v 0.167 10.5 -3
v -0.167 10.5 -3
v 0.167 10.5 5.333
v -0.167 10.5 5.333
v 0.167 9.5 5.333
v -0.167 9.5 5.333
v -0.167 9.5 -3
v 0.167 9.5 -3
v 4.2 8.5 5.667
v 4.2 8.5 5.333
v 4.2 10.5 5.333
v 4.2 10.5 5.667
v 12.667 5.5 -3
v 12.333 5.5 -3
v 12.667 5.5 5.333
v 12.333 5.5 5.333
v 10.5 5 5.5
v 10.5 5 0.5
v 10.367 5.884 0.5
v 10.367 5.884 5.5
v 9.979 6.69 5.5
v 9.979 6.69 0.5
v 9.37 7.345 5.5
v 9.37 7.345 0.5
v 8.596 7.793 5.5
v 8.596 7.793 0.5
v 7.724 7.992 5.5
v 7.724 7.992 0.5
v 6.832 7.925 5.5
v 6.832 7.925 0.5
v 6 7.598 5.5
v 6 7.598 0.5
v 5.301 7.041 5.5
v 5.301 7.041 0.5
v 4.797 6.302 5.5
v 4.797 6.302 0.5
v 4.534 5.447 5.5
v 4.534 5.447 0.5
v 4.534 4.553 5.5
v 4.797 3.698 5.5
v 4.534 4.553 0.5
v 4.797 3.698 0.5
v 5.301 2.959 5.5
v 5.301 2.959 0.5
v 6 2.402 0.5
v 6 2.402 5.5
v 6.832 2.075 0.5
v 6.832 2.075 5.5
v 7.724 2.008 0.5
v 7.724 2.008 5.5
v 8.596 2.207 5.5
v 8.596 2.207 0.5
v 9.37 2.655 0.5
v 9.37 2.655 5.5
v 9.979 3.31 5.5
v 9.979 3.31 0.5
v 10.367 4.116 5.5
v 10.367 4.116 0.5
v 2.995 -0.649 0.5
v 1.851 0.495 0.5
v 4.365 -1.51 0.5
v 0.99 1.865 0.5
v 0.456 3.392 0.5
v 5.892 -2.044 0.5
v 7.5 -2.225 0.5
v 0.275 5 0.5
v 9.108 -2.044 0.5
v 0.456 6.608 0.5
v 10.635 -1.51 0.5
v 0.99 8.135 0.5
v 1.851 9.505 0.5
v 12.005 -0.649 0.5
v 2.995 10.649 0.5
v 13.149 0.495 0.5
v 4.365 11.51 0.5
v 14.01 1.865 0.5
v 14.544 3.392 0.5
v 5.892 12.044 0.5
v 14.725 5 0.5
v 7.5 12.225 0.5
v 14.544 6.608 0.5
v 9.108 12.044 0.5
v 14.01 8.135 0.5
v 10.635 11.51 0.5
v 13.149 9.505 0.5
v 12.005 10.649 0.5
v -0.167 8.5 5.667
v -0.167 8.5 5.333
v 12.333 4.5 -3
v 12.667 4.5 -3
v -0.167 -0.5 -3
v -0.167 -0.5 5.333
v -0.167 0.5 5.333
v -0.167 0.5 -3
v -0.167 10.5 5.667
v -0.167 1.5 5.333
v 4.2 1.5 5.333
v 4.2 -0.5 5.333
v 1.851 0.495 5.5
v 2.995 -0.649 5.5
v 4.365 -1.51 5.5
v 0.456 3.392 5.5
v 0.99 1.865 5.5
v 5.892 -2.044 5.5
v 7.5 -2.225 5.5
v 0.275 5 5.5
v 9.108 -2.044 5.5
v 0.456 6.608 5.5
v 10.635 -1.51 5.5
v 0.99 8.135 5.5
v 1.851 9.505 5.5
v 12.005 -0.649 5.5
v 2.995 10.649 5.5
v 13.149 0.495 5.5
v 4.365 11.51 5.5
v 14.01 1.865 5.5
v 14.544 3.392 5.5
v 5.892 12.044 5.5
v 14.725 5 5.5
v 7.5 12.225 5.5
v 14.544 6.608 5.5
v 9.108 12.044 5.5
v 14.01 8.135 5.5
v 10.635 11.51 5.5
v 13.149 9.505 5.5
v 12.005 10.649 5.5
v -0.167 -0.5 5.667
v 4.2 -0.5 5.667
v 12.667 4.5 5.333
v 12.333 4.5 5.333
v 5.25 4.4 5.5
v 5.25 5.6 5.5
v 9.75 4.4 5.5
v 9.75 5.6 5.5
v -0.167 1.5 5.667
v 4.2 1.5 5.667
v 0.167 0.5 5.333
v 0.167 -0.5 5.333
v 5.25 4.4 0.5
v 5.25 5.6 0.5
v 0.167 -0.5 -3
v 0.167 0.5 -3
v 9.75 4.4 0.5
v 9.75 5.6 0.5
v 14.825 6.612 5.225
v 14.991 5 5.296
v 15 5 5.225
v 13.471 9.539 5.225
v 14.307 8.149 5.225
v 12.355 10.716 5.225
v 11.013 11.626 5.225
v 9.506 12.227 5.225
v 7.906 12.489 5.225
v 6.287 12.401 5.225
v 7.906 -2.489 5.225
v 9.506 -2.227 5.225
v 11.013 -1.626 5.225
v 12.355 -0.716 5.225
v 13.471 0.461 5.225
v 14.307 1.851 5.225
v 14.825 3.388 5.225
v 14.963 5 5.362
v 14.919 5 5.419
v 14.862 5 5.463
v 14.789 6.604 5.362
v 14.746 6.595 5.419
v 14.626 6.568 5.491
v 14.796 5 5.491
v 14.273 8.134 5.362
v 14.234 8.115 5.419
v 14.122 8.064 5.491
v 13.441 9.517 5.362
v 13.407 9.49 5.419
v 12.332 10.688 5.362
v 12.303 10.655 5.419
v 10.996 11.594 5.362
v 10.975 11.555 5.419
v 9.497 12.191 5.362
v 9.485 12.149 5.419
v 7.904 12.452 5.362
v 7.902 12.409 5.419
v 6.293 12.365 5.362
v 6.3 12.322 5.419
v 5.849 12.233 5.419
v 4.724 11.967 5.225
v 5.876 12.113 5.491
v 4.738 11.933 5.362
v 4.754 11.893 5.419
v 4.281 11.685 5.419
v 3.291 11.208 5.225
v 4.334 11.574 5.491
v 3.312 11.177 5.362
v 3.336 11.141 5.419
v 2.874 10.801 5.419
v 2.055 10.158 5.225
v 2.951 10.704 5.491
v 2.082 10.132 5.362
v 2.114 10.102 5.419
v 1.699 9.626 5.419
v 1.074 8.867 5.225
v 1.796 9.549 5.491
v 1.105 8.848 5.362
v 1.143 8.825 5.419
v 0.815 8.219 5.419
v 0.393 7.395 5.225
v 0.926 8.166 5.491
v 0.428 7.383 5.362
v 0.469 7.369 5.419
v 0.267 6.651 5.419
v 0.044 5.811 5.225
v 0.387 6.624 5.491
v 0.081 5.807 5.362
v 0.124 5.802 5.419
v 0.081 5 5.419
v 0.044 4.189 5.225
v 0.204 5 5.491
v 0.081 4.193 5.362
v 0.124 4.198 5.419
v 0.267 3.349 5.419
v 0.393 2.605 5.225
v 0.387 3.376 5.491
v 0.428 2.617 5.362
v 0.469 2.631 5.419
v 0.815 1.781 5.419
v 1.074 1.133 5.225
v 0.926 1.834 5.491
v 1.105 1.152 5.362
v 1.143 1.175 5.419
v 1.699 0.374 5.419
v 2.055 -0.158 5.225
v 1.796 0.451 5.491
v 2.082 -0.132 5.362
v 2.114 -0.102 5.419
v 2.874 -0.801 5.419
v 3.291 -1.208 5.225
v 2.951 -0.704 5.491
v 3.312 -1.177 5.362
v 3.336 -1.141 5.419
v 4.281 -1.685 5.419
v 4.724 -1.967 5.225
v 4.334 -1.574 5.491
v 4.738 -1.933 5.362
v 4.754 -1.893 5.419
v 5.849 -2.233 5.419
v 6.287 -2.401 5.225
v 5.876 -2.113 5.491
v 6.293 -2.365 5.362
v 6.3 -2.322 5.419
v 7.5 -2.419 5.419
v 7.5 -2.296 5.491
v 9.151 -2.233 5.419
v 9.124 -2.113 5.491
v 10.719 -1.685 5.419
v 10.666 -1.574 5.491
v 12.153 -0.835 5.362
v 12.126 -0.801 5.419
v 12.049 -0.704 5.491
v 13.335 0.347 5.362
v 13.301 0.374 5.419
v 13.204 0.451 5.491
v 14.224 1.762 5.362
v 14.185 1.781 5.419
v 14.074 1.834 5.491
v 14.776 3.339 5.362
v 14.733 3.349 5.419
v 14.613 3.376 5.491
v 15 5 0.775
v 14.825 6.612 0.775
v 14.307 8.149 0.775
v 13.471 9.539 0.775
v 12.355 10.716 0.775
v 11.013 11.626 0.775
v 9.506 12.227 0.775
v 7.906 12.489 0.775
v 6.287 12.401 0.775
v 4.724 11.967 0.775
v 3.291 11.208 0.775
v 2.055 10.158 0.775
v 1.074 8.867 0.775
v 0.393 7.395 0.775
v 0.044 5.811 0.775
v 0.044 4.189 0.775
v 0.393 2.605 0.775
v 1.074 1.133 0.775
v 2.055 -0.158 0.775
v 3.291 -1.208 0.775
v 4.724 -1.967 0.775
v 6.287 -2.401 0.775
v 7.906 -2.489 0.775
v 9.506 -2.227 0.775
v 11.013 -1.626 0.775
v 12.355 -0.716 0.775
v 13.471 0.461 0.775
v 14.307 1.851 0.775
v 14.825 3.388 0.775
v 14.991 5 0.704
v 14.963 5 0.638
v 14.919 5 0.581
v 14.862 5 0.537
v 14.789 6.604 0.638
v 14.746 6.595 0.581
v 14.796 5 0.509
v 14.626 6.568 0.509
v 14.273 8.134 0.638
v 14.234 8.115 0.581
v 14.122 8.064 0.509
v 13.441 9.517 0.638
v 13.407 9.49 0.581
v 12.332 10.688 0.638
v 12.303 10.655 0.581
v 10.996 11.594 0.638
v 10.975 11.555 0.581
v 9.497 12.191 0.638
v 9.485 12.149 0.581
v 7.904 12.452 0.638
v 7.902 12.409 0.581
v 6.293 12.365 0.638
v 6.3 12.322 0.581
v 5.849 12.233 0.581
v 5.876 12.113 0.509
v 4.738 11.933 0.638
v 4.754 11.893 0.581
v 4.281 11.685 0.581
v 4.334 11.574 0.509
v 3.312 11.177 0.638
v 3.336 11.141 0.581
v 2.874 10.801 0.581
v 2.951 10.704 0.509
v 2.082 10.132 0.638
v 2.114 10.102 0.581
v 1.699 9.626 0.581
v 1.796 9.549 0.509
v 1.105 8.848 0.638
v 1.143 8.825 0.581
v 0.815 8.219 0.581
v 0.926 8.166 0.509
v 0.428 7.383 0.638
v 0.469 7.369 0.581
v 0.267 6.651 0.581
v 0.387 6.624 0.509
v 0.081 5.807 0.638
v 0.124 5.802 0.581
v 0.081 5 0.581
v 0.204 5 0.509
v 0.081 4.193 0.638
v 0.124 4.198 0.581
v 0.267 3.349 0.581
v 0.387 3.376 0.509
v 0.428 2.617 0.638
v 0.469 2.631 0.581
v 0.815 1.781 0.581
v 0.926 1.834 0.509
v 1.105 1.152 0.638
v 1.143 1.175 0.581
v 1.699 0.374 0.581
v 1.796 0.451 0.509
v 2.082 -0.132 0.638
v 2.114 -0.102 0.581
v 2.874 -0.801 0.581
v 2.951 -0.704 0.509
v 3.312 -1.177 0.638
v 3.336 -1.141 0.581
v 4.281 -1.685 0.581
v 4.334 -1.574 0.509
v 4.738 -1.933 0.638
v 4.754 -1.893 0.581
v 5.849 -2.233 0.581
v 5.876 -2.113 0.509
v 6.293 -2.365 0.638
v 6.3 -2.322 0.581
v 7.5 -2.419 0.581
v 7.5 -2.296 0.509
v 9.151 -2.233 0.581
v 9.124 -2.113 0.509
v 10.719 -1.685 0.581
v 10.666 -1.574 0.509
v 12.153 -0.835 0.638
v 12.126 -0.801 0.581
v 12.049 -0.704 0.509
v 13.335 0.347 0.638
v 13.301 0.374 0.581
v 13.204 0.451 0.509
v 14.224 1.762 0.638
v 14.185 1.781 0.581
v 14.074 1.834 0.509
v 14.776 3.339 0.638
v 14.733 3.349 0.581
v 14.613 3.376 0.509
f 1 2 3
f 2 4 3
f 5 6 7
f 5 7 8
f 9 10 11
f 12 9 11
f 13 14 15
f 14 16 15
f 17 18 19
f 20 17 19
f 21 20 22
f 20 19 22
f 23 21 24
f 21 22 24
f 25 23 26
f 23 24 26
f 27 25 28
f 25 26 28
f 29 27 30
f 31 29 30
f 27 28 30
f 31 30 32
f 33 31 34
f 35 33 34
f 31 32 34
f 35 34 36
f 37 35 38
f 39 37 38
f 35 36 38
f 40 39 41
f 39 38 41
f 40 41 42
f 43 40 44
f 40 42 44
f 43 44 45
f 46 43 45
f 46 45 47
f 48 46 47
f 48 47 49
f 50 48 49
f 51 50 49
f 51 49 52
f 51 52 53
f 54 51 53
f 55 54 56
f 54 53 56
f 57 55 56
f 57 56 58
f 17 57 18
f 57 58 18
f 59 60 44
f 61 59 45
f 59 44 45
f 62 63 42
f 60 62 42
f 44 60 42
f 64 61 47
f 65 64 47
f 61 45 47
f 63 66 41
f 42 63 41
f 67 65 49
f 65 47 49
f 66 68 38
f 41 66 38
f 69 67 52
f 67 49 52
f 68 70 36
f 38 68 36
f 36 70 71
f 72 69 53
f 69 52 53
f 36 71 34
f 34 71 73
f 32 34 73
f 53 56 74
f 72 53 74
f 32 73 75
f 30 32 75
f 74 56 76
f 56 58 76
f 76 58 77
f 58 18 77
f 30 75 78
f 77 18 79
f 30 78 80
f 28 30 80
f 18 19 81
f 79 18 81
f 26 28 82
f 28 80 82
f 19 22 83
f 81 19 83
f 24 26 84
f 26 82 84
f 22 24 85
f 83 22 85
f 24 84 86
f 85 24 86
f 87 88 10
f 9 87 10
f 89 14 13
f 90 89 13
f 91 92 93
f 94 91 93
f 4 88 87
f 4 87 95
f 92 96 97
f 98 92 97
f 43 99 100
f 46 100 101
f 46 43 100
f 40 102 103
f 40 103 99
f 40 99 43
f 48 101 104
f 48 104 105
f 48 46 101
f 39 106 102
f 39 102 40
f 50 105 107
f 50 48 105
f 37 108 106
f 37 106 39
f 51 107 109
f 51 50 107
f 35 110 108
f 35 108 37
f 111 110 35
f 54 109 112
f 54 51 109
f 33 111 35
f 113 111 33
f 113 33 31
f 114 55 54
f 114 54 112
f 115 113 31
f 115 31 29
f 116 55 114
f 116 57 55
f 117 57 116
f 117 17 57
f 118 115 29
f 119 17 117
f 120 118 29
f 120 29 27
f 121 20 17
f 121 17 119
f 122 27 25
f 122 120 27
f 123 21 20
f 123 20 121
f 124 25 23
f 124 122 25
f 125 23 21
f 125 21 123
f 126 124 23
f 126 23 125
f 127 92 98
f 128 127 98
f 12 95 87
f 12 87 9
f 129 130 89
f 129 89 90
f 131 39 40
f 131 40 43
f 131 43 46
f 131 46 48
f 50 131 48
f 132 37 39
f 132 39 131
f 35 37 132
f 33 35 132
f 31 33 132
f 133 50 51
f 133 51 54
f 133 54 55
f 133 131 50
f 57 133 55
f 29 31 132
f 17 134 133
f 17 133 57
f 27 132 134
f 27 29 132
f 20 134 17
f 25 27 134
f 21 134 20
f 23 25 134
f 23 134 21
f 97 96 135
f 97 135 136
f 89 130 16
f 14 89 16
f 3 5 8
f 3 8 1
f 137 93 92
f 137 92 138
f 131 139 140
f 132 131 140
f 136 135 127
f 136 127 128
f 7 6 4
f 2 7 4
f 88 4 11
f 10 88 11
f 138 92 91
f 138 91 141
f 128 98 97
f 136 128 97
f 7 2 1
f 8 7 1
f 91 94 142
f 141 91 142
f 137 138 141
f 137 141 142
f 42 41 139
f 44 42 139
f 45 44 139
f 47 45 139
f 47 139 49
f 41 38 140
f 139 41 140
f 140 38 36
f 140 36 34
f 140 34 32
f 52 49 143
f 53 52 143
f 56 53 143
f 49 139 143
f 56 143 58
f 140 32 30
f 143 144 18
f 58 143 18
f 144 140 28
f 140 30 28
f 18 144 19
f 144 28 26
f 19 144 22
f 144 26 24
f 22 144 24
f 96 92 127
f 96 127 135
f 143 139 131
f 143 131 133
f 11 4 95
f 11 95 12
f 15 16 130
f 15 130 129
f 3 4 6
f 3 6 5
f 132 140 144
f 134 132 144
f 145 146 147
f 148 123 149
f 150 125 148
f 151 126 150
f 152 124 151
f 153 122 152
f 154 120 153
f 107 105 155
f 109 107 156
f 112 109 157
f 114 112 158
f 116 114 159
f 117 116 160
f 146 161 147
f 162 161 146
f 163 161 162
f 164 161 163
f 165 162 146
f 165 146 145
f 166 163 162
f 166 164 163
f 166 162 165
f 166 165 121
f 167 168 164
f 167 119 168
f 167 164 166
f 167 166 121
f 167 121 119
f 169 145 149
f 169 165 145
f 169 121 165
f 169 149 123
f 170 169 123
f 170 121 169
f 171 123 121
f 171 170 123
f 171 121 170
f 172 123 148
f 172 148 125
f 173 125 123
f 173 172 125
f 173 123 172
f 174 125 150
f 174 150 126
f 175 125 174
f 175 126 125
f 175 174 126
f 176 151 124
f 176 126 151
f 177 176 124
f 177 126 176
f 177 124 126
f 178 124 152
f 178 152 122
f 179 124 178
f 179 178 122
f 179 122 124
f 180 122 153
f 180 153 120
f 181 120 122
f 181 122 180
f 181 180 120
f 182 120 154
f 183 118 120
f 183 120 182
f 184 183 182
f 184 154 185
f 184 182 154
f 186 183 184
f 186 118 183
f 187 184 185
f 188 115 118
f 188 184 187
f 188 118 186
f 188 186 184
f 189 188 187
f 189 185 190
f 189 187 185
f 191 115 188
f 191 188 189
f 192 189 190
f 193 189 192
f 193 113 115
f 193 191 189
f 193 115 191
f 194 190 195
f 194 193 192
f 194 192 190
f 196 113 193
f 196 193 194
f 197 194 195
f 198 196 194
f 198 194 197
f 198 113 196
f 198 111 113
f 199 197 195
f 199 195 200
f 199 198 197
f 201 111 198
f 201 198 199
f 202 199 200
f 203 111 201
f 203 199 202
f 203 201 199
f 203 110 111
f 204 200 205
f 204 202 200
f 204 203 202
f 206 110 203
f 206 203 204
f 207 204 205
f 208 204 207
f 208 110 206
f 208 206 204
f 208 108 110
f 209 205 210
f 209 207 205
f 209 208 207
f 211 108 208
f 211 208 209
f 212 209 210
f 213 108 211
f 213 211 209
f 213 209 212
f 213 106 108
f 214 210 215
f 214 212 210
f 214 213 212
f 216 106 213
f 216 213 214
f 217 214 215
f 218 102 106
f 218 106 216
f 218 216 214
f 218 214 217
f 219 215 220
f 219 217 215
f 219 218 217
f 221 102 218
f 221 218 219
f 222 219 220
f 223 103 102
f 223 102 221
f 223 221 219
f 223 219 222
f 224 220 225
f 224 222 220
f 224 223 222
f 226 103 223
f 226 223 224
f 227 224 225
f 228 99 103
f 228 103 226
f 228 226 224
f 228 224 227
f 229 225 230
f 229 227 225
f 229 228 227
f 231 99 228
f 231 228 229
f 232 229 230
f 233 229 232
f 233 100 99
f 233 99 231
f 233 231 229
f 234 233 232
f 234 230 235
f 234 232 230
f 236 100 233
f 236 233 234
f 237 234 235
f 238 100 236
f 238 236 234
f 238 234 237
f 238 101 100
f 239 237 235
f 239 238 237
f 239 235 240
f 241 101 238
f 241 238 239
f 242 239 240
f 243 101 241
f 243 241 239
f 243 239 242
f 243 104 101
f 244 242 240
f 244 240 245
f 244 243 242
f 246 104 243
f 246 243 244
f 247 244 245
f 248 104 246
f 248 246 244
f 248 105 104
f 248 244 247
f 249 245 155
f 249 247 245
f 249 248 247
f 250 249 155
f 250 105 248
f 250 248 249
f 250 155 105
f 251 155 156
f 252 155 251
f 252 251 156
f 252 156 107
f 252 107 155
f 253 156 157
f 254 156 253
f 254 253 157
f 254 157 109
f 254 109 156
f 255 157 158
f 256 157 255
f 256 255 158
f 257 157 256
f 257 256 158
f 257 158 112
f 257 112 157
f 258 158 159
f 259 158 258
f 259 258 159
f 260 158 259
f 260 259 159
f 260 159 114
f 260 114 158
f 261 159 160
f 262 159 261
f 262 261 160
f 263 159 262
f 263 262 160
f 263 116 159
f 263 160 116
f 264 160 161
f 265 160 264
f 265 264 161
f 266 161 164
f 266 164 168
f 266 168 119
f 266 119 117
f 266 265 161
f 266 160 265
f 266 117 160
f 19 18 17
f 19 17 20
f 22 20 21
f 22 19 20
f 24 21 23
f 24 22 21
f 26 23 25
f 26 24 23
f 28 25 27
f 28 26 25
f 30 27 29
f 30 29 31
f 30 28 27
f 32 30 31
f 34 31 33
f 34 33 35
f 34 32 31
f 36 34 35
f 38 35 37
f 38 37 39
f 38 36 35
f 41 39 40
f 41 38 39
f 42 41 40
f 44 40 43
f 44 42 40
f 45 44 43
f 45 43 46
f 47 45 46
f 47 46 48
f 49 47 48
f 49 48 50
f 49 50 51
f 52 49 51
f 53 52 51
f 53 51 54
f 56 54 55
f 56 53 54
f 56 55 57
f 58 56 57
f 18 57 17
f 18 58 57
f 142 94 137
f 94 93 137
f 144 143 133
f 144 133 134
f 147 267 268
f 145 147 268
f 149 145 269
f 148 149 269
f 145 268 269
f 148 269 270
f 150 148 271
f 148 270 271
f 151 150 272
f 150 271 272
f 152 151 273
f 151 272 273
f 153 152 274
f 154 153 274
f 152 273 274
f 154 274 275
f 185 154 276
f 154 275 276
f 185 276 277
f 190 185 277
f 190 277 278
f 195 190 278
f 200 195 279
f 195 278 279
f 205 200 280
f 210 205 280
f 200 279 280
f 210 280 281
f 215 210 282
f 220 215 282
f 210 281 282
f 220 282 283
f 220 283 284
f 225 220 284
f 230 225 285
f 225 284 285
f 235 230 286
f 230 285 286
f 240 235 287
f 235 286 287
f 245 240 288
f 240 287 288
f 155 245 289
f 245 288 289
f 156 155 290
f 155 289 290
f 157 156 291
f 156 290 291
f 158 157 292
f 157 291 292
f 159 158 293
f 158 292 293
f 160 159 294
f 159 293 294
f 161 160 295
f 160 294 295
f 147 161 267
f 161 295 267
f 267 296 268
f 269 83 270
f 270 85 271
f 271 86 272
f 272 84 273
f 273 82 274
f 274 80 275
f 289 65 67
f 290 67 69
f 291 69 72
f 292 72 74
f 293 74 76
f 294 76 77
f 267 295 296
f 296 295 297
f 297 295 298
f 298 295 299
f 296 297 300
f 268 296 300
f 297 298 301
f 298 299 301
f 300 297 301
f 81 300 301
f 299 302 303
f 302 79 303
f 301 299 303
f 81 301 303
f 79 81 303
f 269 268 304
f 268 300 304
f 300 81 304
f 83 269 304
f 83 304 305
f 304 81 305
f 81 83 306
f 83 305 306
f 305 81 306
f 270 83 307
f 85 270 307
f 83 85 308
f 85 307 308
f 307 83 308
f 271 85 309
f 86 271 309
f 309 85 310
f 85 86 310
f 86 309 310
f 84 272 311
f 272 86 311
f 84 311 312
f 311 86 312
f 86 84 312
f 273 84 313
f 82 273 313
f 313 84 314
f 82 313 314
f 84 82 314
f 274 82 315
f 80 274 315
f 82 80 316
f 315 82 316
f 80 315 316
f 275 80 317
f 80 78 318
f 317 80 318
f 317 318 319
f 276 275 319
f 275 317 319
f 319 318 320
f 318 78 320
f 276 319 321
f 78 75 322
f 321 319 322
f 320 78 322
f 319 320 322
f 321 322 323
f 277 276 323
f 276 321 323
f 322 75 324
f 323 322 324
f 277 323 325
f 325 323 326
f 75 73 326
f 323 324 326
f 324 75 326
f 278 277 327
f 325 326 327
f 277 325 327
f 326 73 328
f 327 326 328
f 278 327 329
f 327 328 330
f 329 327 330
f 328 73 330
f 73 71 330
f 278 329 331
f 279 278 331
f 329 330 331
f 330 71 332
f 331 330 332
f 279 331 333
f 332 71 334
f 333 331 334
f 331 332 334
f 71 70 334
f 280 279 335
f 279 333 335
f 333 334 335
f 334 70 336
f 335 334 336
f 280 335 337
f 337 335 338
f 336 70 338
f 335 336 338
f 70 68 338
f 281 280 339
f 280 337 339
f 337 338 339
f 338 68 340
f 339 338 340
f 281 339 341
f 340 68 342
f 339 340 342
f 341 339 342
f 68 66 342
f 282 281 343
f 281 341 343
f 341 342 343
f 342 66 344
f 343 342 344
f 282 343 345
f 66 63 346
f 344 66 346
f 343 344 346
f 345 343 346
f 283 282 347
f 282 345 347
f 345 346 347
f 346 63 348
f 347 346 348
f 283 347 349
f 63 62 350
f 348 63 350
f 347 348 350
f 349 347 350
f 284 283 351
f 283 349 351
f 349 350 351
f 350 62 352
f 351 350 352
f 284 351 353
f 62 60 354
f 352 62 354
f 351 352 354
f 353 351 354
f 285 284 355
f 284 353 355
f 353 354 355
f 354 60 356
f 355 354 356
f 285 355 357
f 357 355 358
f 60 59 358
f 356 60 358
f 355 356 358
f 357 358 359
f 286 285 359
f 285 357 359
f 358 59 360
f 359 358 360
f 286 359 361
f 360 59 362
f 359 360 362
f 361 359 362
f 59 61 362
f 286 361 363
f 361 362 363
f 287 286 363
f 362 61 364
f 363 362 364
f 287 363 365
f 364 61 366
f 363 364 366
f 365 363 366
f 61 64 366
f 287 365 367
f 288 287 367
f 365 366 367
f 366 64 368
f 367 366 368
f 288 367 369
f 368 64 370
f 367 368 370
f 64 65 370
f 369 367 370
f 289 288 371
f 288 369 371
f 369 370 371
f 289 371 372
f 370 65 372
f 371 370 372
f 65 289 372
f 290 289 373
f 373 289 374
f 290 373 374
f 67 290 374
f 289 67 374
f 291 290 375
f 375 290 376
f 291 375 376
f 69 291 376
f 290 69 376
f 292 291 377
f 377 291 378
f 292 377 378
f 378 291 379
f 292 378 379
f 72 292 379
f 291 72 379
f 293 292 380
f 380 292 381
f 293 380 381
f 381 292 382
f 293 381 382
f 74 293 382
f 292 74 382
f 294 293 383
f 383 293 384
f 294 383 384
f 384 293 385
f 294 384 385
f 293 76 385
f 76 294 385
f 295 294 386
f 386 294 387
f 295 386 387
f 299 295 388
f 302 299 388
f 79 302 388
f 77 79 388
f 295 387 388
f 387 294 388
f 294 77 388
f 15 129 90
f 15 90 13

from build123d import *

# Parameters (mm, degrees)
SKETCH003_W       = 0.333334
SKETCH003_H       = 1
PAD002_DEPTH      = 5.333333
PAD002_DEPTH_BACK = 3
SKETCH004_R       = 3
SKETCH004_W       = 4.5
SKETCH004_H       = 1.2
PAD003_DEPTH      = 5
SKETCH_R          = 7.5
SKETCH_R_2        = 3
PAD_DEPTH         = 5
FILLET_R          = 0.275
SKETCH005_W       = 4.366667
SKETCH005_H       = 2
PAD004_DEPTH      = 0.333333


with BuildPart() as pad002:
    # Sketch003 → Pad002 (new body, two sides)
    with BuildSketch(Plane(origin=(0, 10, 0), x_dir=(1, 0, 0), z_dir=(0, 0, 1))) as pad002_sk:
        Rectangle(SKETCH003_W, SKETCH003_H)
        with Locations((12.5, -5)):
            Rectangle(SKETCH003_W, SKETCH003_H)
        with Locations((0, -10)):
            Rectangle(SKETCH003_W, SKETCH003_H)
    extrude(amount=PAD002_DEPTH)
    extrude(pad002_sk.sketch, amount=-PAD002_DEPTH_BACK)


with BuildPart() as pad003:
    # Sketch004 → Pad003 (new body)
    with BuildSketch(Plane(origin=(0, 10, 0.5), x_dir=(1, 0, 0), z_dir=(0, 0, 1))):
        with Locations((7.5, -5)):
            Circle(SKETCH004_R)
        with Locations((7.5, -5)):
            Rectangle(SKETCH004_W, SKETCH004_H, mode=Mode.SUBTRACT)
    extrude(amount=PAD003_DEPTH)


with BuildPart() as fillet_body:
    # Sketch → Pad (new body)
    with BuildSketch(Plane(origin=(0, 10, 0.5), x_dir=(1, 0, 0), z_dir=(0, 0, 1))):
        with Locations((7.5, -5)):
            Circle(SKETCH_R)
        with Locations((7.5, -5)):
            Circle(SKETCH_R_2, mode=Mode.SUBTRACT)
    extrude(amount=PAD_DEPTH)

    # Fillet
    fillet_edges = [fillet_body.edges().sort_by_distance(p)[0] for p in [
        (0, 5, 0.5),
        (0, 5, 5.5),
    ]]
    fillet(fillet_edges, radius=FILLET_R)


with BuildPart() as pad004:
    # Sketch005 → Pad004 (new body)
    with BuildSketch(Plane(origin=(0, 10, 5.333333), x_dir=(1, 0, 0), z_dir=(0, 0, 1))):
        with Locations((2.016666, -0.5)):
            Rectangle(SKETCH005_W, SKETCH005_H)
        with Locations((2.016666, -9.5)):
            Rectangle(SKETCH005_W, SKETCH005_H)
    extrude(amount=PAD004_DEPTH)


solid = Compound([pad002.part, pad003.part, fillet_body.part, pad004.part])
